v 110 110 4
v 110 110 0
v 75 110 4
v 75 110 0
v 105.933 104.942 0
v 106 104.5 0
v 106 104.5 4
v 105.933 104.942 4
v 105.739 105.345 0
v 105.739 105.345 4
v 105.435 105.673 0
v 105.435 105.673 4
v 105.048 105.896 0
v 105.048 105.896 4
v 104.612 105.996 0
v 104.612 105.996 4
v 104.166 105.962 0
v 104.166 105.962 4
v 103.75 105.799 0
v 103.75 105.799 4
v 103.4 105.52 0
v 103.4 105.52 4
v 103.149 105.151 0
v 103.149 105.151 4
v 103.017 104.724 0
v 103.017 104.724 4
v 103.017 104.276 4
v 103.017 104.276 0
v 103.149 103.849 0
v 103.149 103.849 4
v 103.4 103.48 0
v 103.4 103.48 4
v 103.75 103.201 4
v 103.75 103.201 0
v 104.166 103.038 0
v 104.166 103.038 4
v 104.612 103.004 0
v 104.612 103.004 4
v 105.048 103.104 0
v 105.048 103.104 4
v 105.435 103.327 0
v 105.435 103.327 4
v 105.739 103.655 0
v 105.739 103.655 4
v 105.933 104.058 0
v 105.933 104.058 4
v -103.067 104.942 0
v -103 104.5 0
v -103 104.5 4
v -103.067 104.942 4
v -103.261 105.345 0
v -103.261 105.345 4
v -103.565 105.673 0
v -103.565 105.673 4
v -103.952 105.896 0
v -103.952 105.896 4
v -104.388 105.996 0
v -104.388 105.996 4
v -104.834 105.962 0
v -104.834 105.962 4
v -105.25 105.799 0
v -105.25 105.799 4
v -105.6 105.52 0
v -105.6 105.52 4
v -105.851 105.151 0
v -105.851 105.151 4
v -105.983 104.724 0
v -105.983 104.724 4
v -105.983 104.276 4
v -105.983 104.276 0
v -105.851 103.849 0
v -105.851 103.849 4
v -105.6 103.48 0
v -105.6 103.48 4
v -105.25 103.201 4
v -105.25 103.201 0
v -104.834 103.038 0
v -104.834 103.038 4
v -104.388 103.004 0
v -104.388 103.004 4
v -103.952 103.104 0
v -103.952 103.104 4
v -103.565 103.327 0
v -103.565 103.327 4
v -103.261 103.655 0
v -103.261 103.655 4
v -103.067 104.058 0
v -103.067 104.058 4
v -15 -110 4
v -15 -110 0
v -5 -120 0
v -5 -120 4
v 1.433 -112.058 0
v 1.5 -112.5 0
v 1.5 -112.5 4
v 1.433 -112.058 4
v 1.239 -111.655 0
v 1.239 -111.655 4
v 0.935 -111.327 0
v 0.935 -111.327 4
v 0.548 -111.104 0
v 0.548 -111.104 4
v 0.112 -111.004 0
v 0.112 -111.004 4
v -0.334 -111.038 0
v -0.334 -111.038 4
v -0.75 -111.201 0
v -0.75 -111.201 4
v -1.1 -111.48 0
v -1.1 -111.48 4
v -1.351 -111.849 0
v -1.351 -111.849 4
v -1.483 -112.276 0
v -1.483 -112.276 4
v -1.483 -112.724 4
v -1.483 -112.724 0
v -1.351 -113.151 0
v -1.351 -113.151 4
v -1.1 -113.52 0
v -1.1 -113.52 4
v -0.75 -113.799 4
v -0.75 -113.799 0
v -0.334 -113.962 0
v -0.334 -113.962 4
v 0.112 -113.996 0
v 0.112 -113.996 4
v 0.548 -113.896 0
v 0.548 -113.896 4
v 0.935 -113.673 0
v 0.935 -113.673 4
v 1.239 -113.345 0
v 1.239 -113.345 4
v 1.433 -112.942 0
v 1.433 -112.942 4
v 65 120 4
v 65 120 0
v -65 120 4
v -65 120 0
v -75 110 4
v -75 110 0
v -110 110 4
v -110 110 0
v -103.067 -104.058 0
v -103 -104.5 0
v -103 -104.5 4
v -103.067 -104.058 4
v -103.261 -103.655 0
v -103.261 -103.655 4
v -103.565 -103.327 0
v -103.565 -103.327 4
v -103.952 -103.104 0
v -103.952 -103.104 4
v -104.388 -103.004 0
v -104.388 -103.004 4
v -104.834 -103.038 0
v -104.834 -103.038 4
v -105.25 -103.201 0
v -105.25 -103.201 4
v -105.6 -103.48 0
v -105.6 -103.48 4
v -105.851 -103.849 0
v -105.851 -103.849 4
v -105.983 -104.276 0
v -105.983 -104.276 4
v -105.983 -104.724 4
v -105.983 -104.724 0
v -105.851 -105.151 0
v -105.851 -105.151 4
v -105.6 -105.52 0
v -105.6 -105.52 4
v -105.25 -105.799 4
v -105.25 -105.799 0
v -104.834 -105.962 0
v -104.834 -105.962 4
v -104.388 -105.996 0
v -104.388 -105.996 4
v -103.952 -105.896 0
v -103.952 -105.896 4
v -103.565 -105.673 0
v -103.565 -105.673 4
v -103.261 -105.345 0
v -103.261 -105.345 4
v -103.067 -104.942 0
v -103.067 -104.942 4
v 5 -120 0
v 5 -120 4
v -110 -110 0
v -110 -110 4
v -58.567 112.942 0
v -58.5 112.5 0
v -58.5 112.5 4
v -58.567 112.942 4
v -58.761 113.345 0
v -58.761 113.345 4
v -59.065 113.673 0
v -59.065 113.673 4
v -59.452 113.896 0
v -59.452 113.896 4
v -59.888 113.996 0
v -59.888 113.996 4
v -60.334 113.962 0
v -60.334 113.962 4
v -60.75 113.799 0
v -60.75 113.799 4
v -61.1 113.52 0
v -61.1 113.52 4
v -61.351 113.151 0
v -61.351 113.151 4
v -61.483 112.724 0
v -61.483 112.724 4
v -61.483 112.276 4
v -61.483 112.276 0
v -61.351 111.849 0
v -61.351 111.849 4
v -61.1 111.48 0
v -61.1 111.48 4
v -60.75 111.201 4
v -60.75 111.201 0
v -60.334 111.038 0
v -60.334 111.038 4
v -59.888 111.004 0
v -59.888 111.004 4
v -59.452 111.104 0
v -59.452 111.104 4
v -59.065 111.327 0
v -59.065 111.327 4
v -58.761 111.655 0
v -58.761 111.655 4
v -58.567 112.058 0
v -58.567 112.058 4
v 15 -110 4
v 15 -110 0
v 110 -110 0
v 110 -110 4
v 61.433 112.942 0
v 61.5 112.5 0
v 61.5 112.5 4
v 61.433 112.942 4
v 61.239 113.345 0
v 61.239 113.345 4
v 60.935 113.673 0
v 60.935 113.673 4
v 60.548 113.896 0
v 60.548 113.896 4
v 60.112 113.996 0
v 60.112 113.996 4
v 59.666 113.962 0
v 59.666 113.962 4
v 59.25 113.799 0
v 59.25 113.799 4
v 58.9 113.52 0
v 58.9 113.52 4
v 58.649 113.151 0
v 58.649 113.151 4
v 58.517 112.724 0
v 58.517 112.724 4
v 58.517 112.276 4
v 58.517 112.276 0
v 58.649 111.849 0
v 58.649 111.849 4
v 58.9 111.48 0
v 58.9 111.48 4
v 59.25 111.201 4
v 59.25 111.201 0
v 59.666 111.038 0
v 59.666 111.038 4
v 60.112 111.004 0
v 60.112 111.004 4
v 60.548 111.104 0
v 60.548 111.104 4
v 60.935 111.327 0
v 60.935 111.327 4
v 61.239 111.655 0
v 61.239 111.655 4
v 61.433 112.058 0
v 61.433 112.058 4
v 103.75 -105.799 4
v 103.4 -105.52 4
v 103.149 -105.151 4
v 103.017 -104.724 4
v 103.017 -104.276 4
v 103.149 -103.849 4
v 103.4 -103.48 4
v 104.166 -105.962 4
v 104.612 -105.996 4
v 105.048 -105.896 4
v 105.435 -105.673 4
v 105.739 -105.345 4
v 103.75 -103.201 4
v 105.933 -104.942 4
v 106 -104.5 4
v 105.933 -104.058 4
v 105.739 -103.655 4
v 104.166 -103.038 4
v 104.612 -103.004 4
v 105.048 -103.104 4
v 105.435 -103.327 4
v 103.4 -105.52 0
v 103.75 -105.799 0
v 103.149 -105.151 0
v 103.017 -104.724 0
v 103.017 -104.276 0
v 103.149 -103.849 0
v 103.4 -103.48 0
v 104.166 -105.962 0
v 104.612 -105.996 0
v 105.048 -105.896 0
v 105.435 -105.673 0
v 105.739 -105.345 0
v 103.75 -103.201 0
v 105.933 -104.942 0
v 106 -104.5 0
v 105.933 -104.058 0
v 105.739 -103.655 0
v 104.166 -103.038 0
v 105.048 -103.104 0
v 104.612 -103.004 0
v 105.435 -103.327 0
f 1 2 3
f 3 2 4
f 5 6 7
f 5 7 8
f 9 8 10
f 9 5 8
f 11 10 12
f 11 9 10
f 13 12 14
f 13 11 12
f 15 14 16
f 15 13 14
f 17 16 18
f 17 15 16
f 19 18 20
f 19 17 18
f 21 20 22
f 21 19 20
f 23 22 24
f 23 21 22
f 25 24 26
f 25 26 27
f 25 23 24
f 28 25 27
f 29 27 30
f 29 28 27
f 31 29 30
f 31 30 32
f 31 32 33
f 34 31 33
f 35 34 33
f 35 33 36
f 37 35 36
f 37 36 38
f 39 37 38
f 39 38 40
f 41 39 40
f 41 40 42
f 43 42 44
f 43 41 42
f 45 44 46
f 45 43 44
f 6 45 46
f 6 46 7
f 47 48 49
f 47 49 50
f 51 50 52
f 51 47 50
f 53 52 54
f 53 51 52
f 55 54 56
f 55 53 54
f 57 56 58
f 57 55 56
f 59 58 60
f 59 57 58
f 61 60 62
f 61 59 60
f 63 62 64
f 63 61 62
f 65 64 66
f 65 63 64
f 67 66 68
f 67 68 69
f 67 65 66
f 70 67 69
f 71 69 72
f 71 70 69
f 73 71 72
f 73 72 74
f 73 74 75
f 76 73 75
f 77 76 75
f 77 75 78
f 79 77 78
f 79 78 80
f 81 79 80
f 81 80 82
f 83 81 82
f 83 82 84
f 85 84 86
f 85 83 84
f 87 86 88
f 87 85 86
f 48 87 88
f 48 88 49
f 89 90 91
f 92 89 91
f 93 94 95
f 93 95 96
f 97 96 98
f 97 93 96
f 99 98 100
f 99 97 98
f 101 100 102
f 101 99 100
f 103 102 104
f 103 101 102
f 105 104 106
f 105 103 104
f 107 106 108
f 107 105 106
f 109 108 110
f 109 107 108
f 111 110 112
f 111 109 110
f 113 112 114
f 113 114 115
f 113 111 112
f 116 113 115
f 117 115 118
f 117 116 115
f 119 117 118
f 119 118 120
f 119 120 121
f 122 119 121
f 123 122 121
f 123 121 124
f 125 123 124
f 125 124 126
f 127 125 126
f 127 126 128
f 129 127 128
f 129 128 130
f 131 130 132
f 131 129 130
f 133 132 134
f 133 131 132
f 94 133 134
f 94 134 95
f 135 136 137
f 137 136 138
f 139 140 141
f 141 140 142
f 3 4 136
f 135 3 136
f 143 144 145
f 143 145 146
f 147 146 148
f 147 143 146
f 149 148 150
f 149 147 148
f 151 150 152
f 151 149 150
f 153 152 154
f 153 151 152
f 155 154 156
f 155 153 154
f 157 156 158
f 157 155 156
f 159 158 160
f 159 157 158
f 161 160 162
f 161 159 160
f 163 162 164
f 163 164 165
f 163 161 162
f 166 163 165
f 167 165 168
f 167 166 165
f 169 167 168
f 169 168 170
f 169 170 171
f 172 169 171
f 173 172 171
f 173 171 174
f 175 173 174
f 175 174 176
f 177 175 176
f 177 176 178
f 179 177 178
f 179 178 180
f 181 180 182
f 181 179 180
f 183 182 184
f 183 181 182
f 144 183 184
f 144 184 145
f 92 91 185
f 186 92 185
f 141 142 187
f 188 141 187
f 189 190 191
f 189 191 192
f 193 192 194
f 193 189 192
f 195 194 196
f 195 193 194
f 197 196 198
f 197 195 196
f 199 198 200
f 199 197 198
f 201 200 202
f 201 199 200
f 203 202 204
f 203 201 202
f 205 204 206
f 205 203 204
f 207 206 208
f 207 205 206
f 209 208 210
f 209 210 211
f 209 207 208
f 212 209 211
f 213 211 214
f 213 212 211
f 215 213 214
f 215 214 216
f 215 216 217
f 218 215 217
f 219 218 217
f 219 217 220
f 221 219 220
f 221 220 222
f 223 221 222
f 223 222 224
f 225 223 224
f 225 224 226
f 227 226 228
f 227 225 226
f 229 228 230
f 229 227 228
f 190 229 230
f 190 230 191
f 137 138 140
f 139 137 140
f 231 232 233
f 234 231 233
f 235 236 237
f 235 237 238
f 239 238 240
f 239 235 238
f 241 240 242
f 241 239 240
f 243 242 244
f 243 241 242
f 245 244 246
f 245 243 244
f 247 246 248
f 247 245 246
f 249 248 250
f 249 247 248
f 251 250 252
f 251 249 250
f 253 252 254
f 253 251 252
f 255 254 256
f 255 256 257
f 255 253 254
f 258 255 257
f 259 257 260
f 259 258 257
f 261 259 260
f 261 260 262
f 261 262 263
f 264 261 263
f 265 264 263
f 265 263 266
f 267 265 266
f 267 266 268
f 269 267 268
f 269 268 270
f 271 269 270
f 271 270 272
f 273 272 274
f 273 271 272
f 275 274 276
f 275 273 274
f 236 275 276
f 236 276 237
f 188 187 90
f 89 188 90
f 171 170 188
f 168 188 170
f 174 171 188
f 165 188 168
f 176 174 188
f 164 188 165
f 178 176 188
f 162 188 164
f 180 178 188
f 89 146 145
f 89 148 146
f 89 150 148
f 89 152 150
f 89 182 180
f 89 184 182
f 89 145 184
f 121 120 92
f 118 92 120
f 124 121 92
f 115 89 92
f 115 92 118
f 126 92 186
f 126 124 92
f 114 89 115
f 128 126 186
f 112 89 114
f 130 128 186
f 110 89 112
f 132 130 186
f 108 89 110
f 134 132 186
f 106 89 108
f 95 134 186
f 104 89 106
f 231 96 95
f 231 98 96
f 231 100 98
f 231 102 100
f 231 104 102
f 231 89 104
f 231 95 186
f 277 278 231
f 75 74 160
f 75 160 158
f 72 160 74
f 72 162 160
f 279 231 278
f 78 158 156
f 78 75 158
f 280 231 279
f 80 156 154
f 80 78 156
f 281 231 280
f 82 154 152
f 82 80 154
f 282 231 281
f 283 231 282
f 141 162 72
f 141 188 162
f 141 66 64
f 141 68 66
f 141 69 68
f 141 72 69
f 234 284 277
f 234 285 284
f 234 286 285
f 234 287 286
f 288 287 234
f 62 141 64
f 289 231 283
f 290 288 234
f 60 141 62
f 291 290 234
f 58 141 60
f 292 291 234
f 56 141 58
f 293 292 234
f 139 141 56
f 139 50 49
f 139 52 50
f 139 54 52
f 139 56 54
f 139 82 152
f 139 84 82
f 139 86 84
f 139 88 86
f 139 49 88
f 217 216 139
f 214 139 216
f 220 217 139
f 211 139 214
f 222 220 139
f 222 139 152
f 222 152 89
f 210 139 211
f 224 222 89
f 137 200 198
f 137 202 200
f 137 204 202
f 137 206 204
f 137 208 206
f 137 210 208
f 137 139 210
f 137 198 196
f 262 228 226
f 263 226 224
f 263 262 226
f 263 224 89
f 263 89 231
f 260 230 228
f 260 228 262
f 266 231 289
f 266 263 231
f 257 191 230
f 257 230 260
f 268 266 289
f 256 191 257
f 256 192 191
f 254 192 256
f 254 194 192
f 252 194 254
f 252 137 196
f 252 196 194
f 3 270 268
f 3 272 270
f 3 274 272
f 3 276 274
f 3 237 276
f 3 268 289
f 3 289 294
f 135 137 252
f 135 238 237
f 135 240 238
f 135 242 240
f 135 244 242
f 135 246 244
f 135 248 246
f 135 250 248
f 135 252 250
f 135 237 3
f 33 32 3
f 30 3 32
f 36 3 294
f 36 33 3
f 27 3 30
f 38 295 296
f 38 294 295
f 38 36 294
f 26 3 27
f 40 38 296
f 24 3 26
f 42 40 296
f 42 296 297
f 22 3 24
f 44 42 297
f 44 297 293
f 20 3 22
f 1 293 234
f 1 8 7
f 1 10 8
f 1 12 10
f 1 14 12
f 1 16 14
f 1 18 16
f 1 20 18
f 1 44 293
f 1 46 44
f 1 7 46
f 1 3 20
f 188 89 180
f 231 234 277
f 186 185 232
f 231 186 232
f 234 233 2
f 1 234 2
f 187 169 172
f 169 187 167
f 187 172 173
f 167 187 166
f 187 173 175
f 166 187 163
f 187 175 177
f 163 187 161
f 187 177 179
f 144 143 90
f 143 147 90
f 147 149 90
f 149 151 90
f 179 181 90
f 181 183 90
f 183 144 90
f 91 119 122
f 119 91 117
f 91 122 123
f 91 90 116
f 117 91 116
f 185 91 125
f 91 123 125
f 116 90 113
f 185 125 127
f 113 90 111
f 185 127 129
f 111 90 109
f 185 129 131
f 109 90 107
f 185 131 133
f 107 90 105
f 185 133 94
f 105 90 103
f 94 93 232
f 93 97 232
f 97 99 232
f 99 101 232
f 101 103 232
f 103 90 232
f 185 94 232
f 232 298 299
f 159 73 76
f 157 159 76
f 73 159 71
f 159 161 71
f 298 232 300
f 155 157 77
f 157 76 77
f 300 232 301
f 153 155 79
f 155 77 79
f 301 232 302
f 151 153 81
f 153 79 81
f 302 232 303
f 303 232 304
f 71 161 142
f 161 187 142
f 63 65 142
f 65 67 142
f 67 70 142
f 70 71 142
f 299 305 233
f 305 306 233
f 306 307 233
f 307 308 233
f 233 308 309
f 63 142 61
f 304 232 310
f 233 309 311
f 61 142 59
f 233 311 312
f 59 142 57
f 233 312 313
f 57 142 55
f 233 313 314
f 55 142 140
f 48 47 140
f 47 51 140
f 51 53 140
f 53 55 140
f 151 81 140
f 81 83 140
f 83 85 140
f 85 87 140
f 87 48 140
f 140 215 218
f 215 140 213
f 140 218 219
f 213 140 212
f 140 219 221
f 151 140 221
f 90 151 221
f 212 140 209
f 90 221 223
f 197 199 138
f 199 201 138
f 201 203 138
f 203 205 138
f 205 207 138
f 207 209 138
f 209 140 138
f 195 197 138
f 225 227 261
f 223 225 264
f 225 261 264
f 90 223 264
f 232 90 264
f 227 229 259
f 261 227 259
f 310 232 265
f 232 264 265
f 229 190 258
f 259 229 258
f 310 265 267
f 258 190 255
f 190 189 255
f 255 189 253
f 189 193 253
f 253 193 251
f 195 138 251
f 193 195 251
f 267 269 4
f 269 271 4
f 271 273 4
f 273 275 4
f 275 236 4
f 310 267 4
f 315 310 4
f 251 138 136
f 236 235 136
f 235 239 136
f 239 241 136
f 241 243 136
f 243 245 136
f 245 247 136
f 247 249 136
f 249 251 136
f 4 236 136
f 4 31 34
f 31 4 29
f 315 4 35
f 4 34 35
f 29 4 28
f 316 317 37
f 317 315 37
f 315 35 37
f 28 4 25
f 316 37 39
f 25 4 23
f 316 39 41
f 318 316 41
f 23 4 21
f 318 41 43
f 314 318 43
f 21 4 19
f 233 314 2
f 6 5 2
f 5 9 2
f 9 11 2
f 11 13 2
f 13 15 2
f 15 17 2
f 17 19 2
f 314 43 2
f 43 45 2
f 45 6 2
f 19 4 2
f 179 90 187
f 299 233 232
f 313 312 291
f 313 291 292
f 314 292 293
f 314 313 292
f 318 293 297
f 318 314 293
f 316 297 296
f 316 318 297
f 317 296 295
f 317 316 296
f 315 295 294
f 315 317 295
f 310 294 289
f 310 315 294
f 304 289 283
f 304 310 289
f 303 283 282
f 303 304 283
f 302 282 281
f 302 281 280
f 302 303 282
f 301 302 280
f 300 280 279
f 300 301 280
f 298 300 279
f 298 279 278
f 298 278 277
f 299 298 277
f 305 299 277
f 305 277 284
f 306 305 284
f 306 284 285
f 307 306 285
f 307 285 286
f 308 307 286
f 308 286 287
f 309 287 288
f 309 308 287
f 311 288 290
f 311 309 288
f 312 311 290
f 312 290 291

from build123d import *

# Parameters (mm, degrees)
F0_R     = 1.5
F1_DEPTH = 4


with BuildPart() as f1:
    # F0 (on Top) → F1 (new body)
    with BuildSketch(Plane.XY):
        Polygon((-75, 110), (-110, 110), (-110, -110), (-15, -110), (-5, -120), (0, -120), (5, -120), (15, -110), (110, -110), (110, 110), (75, 110), (65, 120), (0, 120), (-65, 120), align=None)
        with Locations((-104.5, -104.5)):
            Circle(F0_R, mode=Mode.SUBTRACT)
        with Locations((0, -112.5)):
            Circle(F0_R, mode=Mode.SUBTRACT)
        with Locations((104.5, -104.5)):
            Circle(F0_R, mode=Mode.SUBTRACT)
        with Locations((-104.5, 104.5)):
            Circle(F0_R, mode=Mode.SUBTRACT)
        with Locations((-60, 112.5)):
            Circle(F0_R, mode=Mode.SUBTRACT)
        with Locations((60, 112.5)):
            Circle(F0_R, mode=Mode.SUBTRACT)
        with Locations((104.5, 104.5)):
            Circle(F0_R, mode=Mode.SUBTRACT)
    extrude(amount=F1_DEPTH)


solid = f1.part
